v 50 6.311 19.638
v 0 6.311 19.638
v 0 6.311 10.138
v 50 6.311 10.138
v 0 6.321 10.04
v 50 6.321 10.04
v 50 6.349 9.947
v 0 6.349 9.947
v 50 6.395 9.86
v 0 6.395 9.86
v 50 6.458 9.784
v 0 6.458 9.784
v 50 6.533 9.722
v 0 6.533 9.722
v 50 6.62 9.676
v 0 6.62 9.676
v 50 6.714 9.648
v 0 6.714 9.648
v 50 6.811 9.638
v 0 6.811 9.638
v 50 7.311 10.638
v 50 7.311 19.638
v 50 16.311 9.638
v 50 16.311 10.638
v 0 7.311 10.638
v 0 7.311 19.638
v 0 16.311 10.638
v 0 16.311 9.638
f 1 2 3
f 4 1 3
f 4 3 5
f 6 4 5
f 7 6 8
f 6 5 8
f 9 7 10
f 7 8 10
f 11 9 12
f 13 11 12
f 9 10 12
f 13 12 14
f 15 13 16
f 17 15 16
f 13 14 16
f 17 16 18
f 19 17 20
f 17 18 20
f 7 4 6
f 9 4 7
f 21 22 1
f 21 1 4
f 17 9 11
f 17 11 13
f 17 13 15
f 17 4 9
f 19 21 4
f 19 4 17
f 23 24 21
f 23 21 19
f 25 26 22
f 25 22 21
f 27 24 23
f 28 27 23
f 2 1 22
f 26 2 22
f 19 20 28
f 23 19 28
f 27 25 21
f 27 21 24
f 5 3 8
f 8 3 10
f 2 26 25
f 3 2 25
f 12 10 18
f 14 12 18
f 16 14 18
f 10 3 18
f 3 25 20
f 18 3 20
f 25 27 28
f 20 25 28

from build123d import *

# Parameters (mm, degrees)
SKETCH1_W           = 9
SKETCH1_H           = 1
SKETCH1_W_2         = 1
SKETCH1_H_2         = 9
BOSS_EXTRUDE1_DEPTH = 50


with BuildPart() as part:
    # Sketch1 → Boss-Extrude1 (new body)
    with BuildSketch(Plane(origin=(0, 0, 0), x_dir=(0, 0, -1), z_dir=(1, 0, 0))):
        with Locations((-15.137894846, 6.81112979)):
            Rectangle(SKETCH1_W, SKETCH1_H)
        with Locations((-10.137894846, 11.81112979)):
            Rectangle(SKETCH1_W_2, SKETCH1_H_2)
        with BuildLine():
            Line((-9.637894846, 7.31112979), (-10.637894846, 7.31112979))
            Line((-10.637894846, 7.31112979), (-10.637894846, 6.31112979))
            Line((-10.637894846, 6.31112979), (-10.137894846, 6.31112979))
            ThreePointArc((-10.137894846, 6.31112979), (-9.784341456, 6.4575764), (-9.637894846, 6.81112979))
            Line((-9.637894846, 6.81112979), (-9.637894846, 7.31112979))
        make_face()
    extrude(amount=BOSS_EXTRUDE1_DEPTH)


solid = part.part
